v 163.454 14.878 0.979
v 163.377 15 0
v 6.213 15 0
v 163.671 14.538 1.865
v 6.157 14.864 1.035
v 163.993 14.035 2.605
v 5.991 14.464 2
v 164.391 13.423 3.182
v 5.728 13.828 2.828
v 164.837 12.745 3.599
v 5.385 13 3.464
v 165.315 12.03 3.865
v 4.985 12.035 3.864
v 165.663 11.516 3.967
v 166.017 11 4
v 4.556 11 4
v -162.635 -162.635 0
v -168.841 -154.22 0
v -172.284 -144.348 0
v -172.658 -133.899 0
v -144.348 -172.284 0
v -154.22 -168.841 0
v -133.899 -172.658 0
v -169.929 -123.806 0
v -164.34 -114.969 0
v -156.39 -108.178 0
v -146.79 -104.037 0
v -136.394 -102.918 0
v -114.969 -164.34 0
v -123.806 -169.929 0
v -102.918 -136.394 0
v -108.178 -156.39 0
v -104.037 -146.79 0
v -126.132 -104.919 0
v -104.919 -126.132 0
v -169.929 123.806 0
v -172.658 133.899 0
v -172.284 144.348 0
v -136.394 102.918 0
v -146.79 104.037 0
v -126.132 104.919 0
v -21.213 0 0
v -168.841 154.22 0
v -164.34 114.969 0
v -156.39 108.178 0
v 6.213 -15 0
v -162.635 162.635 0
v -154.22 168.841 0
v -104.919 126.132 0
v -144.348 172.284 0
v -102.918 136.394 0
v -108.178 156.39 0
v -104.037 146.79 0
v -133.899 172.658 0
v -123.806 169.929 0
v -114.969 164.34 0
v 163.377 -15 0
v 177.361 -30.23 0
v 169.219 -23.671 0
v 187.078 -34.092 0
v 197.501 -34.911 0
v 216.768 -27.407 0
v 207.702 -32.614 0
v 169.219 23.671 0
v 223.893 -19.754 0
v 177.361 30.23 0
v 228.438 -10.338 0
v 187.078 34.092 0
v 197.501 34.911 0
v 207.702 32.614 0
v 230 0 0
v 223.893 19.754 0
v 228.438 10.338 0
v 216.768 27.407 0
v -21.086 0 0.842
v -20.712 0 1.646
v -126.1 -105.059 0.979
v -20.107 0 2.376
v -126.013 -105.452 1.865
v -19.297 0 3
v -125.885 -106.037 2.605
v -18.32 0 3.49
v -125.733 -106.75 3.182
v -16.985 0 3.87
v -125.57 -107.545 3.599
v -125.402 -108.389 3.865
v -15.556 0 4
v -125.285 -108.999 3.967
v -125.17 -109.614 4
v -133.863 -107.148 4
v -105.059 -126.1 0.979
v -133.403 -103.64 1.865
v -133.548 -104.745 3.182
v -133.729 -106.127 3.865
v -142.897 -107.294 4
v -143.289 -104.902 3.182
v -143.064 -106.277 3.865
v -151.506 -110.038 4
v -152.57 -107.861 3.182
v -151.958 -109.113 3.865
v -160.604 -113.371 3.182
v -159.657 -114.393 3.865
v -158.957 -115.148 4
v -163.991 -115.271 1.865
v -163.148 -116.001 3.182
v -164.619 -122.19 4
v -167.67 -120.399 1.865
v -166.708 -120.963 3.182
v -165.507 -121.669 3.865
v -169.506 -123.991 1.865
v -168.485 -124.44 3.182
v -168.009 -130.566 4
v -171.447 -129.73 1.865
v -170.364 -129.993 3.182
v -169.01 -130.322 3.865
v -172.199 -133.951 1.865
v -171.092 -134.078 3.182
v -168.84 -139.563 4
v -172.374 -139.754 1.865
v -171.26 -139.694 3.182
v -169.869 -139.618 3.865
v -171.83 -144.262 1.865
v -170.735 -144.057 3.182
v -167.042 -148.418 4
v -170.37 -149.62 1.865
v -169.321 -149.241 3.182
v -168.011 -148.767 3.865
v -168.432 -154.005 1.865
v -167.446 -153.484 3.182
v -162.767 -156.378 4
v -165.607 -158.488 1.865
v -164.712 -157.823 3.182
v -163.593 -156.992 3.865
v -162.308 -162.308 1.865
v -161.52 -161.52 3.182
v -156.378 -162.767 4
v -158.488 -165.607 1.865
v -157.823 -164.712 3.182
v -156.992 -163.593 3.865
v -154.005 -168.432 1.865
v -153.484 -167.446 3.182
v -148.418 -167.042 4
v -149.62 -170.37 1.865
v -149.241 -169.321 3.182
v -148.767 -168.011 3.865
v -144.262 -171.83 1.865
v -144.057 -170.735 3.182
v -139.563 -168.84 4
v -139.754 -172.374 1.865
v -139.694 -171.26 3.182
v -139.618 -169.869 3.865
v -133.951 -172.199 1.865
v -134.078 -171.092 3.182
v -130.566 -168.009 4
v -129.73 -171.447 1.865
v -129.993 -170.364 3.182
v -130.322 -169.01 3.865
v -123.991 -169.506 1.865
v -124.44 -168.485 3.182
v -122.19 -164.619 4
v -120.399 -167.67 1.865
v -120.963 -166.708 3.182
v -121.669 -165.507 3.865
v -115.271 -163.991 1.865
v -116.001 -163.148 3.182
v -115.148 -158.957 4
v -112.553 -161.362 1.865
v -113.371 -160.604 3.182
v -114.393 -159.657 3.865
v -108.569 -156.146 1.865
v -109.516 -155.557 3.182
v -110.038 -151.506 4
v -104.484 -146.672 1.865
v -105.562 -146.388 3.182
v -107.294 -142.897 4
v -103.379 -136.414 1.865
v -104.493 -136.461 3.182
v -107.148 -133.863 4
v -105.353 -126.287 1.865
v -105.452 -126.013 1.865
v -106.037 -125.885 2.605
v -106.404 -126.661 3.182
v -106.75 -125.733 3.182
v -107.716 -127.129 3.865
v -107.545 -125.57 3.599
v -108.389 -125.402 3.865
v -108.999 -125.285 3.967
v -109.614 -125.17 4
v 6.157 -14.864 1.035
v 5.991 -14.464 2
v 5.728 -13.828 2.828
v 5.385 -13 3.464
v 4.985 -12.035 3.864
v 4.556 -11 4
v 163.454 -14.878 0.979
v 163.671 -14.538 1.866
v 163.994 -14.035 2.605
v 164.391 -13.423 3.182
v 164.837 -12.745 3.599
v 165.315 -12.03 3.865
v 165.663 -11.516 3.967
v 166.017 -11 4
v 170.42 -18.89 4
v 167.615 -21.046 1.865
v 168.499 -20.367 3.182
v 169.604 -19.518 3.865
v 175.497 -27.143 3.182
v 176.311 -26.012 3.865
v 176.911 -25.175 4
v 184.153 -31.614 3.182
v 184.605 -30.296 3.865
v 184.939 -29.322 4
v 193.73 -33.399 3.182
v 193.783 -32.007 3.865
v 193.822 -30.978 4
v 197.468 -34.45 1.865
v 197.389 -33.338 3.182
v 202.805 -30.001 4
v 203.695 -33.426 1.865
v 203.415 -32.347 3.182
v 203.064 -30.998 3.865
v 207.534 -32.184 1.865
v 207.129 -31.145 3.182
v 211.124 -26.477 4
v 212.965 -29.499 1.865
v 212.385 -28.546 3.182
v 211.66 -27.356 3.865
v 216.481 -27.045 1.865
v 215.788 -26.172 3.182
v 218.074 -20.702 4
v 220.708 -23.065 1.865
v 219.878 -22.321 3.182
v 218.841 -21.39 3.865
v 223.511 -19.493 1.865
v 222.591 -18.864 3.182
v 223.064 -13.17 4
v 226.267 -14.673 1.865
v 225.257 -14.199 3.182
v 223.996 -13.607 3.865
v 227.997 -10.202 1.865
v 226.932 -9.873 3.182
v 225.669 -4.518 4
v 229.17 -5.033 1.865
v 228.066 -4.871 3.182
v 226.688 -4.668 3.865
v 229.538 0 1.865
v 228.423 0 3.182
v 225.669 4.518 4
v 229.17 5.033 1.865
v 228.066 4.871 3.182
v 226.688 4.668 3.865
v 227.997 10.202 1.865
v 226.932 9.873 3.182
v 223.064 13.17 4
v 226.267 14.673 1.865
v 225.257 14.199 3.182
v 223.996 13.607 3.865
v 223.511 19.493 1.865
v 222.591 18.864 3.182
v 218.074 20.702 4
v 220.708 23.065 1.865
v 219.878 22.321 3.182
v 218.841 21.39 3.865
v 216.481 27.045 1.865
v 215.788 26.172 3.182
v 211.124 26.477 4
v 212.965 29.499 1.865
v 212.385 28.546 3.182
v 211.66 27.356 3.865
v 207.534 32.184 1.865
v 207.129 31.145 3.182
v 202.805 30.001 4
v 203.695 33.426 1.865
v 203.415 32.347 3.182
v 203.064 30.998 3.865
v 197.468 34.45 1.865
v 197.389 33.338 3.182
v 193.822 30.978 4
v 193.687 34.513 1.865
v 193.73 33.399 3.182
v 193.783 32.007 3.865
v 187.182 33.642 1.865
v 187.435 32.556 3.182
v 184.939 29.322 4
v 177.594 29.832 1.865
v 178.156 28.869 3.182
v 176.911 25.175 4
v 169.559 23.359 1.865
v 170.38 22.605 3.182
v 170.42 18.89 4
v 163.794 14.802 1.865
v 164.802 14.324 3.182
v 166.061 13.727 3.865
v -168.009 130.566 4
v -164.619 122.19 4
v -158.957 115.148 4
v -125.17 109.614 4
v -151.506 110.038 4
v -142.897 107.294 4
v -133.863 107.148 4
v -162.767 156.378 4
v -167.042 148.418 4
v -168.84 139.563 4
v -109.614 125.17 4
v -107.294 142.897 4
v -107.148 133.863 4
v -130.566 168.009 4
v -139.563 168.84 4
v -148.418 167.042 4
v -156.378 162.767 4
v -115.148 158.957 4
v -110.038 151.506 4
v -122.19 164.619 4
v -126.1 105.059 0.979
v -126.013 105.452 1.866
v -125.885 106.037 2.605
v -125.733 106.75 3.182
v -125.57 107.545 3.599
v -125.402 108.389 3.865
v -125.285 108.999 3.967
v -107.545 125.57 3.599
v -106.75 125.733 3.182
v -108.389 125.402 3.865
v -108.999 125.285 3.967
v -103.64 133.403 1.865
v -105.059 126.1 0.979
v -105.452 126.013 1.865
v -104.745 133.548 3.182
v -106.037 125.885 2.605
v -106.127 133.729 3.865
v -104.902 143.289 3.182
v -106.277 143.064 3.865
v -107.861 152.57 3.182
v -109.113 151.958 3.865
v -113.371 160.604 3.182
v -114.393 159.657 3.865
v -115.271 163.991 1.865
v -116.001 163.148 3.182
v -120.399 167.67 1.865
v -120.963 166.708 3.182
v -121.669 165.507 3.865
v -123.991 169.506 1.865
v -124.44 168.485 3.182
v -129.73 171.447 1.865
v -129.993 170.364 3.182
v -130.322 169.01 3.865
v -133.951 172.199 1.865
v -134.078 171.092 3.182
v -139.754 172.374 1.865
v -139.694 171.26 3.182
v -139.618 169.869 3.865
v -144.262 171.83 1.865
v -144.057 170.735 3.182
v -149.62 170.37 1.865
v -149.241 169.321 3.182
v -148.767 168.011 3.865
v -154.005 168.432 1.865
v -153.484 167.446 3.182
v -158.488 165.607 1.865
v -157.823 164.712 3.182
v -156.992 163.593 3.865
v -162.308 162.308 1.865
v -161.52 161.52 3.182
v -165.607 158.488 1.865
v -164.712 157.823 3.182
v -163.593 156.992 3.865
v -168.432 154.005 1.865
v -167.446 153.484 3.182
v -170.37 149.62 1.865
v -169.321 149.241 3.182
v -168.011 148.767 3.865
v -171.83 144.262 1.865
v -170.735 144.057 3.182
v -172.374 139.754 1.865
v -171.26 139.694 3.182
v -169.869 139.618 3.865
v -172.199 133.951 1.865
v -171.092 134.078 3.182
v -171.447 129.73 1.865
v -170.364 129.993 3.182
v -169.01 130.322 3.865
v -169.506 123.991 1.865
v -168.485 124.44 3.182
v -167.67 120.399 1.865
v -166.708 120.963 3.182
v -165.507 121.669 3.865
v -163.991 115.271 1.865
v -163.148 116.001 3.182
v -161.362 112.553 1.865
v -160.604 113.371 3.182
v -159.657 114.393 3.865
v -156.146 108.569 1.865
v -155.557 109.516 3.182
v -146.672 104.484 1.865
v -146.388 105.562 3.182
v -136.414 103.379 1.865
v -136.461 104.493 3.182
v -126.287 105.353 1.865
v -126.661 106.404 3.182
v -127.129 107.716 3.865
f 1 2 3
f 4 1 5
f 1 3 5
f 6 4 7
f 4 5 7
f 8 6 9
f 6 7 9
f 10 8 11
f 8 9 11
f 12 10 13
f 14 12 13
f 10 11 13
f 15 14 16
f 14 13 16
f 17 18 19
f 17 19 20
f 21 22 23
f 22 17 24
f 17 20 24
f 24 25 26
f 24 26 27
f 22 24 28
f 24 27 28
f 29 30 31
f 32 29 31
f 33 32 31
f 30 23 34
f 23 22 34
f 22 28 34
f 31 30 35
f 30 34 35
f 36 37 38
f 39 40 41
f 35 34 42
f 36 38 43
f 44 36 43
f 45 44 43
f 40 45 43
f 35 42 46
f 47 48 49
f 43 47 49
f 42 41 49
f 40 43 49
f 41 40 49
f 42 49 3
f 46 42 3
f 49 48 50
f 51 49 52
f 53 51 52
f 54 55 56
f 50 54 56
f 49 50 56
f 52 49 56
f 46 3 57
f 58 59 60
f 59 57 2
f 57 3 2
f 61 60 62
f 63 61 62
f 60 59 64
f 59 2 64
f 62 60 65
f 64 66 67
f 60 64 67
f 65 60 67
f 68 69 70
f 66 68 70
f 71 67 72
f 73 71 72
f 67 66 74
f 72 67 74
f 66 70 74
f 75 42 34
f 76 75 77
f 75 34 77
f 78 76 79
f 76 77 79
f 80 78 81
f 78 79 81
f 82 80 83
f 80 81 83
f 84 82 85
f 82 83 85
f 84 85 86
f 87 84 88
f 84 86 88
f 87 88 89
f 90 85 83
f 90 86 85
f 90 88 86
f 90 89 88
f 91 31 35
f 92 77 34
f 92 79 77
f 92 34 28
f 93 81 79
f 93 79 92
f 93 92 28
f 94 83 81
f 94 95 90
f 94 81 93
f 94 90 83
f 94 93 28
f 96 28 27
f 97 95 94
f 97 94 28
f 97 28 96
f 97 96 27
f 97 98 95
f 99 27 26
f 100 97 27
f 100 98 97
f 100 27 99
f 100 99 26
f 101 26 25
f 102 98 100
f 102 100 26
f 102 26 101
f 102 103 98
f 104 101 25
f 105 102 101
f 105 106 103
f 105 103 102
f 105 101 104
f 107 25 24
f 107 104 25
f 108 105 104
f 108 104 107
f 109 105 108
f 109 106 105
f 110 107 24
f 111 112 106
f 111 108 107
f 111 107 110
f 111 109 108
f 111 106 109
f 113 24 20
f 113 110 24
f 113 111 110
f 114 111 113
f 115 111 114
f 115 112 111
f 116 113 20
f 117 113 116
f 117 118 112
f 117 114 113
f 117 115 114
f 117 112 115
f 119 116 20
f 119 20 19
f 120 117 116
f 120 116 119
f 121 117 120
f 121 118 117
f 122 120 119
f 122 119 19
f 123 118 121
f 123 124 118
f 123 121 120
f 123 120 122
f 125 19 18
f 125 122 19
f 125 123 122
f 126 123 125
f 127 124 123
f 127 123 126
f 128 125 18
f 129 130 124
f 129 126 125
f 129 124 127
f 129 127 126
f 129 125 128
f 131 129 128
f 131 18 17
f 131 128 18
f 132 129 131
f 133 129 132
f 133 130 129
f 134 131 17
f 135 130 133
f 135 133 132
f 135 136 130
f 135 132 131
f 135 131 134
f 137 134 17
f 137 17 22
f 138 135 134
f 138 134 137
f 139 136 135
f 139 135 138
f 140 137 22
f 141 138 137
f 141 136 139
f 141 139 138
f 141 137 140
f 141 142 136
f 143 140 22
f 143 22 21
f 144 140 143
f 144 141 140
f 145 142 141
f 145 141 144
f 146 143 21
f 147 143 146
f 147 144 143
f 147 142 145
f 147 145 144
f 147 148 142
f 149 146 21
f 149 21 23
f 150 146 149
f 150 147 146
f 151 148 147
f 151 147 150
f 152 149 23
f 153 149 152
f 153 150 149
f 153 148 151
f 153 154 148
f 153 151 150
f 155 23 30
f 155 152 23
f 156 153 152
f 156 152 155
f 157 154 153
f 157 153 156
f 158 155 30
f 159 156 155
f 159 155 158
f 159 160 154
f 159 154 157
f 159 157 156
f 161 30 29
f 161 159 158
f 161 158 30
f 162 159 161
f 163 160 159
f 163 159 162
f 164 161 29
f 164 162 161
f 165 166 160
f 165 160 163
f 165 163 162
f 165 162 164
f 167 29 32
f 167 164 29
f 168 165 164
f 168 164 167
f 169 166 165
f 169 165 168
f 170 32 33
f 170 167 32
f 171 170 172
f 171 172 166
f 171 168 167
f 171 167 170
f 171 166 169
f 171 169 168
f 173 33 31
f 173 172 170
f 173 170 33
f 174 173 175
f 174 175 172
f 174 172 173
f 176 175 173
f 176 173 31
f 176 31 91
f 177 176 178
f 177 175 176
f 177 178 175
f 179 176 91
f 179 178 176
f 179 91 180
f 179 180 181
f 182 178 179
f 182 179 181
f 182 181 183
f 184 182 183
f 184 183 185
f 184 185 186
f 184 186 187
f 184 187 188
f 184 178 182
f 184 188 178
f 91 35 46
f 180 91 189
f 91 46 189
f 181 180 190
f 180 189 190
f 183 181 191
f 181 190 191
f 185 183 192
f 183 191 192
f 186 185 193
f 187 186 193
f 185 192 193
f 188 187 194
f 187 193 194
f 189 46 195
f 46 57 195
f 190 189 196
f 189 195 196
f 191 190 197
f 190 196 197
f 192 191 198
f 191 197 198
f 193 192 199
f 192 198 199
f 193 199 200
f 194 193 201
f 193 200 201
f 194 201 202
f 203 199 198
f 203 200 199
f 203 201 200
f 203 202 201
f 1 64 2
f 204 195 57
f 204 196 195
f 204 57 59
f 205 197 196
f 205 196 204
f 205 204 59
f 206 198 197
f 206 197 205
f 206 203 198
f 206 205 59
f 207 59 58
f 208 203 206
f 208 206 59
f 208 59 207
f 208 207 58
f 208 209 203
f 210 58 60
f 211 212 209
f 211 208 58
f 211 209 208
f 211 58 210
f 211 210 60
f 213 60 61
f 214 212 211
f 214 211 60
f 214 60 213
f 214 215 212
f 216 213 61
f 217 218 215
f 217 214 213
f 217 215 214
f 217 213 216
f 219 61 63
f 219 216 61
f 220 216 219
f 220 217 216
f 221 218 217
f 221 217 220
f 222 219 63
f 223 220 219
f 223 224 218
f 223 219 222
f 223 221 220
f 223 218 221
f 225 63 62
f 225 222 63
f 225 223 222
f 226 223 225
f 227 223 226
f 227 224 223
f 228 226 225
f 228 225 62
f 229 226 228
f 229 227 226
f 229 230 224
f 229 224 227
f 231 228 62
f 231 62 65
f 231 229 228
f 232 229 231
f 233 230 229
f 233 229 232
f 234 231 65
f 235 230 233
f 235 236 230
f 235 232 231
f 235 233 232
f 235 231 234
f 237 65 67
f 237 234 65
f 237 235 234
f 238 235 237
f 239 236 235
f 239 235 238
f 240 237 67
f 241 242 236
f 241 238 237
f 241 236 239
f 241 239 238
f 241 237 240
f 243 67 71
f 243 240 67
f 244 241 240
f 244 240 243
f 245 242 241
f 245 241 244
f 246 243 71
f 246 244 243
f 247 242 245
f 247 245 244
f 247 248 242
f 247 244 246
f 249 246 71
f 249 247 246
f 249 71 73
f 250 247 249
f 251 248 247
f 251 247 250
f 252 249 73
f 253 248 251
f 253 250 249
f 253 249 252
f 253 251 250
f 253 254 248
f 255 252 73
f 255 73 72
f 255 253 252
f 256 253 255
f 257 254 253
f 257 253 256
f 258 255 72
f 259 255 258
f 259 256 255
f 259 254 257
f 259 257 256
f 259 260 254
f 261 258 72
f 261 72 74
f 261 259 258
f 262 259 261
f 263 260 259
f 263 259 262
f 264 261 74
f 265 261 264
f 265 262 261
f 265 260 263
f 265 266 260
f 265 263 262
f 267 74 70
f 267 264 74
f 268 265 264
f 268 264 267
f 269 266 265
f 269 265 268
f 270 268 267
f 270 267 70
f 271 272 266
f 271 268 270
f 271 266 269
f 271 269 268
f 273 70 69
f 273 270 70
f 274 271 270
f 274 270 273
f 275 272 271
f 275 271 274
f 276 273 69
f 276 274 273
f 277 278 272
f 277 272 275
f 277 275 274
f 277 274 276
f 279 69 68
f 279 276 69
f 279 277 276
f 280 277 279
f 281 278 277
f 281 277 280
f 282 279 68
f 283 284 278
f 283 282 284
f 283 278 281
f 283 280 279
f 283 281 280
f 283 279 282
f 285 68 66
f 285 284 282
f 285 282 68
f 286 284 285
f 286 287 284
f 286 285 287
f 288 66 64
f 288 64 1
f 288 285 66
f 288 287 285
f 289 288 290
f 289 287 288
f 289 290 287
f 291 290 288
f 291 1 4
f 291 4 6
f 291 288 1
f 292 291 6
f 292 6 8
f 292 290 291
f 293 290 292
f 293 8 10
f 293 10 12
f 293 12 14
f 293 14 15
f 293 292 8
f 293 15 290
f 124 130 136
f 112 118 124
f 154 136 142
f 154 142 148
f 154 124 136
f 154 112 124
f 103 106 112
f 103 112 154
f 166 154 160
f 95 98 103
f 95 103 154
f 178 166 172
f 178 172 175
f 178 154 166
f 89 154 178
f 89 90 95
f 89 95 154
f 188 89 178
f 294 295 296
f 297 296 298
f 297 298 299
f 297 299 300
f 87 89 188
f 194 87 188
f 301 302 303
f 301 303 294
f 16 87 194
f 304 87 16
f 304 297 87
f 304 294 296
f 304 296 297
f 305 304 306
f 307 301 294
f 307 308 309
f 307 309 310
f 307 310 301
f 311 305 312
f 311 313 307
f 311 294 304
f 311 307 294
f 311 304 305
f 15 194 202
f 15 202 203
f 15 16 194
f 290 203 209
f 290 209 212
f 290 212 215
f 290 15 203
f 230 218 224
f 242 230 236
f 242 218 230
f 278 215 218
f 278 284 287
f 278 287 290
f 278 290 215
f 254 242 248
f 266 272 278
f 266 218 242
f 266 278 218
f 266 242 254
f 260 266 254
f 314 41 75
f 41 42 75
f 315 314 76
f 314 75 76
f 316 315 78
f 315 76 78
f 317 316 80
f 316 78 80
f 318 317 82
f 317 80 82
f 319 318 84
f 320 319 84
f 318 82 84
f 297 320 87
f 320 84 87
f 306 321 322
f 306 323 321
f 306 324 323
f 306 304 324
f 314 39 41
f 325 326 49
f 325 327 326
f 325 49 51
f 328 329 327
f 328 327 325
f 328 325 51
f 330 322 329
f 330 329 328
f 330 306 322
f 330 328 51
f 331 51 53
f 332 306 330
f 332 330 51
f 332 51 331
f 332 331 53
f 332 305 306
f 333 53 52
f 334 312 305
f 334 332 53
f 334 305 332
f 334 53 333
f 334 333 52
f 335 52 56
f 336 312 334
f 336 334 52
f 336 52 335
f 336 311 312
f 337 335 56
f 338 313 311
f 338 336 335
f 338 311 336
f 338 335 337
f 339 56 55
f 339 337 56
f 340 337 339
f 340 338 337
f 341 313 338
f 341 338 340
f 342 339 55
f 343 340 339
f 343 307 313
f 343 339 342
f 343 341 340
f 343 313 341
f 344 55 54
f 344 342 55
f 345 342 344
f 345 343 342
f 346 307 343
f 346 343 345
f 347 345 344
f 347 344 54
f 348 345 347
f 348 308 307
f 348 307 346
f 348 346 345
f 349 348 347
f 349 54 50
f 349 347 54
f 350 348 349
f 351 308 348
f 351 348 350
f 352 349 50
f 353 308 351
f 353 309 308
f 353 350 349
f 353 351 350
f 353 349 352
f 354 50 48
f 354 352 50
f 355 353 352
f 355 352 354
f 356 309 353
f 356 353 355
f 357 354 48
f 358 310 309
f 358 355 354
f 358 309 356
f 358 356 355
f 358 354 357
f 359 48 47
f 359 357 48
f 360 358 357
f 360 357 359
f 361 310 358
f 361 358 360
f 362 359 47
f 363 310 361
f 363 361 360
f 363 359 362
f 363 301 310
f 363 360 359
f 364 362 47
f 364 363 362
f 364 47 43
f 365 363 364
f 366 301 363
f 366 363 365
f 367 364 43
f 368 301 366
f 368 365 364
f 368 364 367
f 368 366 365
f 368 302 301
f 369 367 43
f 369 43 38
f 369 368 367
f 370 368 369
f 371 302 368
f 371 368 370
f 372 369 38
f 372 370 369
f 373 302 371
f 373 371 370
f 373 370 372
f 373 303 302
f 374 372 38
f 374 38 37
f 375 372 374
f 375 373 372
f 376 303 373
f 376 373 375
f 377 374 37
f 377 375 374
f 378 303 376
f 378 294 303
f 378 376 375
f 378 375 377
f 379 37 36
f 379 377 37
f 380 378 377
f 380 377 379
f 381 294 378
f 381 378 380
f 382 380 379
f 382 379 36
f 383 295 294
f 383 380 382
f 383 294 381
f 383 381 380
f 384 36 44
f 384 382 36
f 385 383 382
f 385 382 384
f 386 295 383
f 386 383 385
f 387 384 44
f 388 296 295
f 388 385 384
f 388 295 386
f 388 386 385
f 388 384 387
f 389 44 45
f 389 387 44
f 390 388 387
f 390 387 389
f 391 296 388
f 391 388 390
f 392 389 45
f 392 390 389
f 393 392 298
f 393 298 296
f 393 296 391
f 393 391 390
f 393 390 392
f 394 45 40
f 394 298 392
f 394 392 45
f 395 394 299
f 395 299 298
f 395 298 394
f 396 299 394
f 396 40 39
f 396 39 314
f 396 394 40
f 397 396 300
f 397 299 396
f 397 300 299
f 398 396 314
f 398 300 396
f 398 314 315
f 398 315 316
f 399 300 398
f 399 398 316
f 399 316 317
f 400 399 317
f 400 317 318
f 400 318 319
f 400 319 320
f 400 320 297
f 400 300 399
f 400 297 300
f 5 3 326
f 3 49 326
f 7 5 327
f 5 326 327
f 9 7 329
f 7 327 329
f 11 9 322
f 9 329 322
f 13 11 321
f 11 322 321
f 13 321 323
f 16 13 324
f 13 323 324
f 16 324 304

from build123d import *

# Parameters (mm, degrees)
F1_DEPTH = 4
F2_R     = 3.99999


# Not quite as in the source:
# - a fillet or chamfer is up to 0.001 mm smaller than in the source, because OpenCascade refuses the exact size


with BuildPart() as f1:
    # F0 (on Top) → F1 (new body)
    with BuildSketch(Plane.XY):
        with BuildLine():
            Line((6.2132034356, -15), (163.3772233983, -15))
            ThreePointArc((163.3772233983, -15), (230, 0), (163.3772233983, 15))
            Line((163.3772233983, 15), (6.2132034356, 15))
            Line((6.2132034356, 15), (-104.9185408386, 126.1317442742))
            ThreePointArc((-104.9185408386, 126.1317442742), (-162.6345596729, 162.6345596729), (-126.1317442742, 104.9185408386))
            Line((-126.1317442742, 104.9185408386), (-21.2132034356, 0))
            Line((-21.2132034356, 0), (-126.1317442742, -104.9185408386))
            ThreePointArc((-126.1317442742, -104.9185408386), (-162.6345596729, -162.6345596729), (-104.9185408386, -126.1317442742))
            Line((-104.9185408386, -126.1317442742), (6.2132034356, -15))
        make_face()
    extrude(amount=F1_DEPTH)

    # F2 (radius 4 in the source; OpenCascade refuses exactly that, so slightly less here)
    f2_edges = [f1.edges().sort_by_distance(p)[0] for p in [
        (-49.352669, -70.565872, 4),
        (84.795213, -15, 4),
        (230, 0, 4),
        (84.795213, 15, 4),
        (-49.352669, 70.565872, 4),
        (-162.63456, 162.63456, 4),
        (-73.672474, 52.45927, 4),
        (-73.672474, -52.45927, 4),
        (-162.63456, -162.63456, 4),
    ]]
    fillet(f2_edges, radius=F2_R)


solid = f1.part
